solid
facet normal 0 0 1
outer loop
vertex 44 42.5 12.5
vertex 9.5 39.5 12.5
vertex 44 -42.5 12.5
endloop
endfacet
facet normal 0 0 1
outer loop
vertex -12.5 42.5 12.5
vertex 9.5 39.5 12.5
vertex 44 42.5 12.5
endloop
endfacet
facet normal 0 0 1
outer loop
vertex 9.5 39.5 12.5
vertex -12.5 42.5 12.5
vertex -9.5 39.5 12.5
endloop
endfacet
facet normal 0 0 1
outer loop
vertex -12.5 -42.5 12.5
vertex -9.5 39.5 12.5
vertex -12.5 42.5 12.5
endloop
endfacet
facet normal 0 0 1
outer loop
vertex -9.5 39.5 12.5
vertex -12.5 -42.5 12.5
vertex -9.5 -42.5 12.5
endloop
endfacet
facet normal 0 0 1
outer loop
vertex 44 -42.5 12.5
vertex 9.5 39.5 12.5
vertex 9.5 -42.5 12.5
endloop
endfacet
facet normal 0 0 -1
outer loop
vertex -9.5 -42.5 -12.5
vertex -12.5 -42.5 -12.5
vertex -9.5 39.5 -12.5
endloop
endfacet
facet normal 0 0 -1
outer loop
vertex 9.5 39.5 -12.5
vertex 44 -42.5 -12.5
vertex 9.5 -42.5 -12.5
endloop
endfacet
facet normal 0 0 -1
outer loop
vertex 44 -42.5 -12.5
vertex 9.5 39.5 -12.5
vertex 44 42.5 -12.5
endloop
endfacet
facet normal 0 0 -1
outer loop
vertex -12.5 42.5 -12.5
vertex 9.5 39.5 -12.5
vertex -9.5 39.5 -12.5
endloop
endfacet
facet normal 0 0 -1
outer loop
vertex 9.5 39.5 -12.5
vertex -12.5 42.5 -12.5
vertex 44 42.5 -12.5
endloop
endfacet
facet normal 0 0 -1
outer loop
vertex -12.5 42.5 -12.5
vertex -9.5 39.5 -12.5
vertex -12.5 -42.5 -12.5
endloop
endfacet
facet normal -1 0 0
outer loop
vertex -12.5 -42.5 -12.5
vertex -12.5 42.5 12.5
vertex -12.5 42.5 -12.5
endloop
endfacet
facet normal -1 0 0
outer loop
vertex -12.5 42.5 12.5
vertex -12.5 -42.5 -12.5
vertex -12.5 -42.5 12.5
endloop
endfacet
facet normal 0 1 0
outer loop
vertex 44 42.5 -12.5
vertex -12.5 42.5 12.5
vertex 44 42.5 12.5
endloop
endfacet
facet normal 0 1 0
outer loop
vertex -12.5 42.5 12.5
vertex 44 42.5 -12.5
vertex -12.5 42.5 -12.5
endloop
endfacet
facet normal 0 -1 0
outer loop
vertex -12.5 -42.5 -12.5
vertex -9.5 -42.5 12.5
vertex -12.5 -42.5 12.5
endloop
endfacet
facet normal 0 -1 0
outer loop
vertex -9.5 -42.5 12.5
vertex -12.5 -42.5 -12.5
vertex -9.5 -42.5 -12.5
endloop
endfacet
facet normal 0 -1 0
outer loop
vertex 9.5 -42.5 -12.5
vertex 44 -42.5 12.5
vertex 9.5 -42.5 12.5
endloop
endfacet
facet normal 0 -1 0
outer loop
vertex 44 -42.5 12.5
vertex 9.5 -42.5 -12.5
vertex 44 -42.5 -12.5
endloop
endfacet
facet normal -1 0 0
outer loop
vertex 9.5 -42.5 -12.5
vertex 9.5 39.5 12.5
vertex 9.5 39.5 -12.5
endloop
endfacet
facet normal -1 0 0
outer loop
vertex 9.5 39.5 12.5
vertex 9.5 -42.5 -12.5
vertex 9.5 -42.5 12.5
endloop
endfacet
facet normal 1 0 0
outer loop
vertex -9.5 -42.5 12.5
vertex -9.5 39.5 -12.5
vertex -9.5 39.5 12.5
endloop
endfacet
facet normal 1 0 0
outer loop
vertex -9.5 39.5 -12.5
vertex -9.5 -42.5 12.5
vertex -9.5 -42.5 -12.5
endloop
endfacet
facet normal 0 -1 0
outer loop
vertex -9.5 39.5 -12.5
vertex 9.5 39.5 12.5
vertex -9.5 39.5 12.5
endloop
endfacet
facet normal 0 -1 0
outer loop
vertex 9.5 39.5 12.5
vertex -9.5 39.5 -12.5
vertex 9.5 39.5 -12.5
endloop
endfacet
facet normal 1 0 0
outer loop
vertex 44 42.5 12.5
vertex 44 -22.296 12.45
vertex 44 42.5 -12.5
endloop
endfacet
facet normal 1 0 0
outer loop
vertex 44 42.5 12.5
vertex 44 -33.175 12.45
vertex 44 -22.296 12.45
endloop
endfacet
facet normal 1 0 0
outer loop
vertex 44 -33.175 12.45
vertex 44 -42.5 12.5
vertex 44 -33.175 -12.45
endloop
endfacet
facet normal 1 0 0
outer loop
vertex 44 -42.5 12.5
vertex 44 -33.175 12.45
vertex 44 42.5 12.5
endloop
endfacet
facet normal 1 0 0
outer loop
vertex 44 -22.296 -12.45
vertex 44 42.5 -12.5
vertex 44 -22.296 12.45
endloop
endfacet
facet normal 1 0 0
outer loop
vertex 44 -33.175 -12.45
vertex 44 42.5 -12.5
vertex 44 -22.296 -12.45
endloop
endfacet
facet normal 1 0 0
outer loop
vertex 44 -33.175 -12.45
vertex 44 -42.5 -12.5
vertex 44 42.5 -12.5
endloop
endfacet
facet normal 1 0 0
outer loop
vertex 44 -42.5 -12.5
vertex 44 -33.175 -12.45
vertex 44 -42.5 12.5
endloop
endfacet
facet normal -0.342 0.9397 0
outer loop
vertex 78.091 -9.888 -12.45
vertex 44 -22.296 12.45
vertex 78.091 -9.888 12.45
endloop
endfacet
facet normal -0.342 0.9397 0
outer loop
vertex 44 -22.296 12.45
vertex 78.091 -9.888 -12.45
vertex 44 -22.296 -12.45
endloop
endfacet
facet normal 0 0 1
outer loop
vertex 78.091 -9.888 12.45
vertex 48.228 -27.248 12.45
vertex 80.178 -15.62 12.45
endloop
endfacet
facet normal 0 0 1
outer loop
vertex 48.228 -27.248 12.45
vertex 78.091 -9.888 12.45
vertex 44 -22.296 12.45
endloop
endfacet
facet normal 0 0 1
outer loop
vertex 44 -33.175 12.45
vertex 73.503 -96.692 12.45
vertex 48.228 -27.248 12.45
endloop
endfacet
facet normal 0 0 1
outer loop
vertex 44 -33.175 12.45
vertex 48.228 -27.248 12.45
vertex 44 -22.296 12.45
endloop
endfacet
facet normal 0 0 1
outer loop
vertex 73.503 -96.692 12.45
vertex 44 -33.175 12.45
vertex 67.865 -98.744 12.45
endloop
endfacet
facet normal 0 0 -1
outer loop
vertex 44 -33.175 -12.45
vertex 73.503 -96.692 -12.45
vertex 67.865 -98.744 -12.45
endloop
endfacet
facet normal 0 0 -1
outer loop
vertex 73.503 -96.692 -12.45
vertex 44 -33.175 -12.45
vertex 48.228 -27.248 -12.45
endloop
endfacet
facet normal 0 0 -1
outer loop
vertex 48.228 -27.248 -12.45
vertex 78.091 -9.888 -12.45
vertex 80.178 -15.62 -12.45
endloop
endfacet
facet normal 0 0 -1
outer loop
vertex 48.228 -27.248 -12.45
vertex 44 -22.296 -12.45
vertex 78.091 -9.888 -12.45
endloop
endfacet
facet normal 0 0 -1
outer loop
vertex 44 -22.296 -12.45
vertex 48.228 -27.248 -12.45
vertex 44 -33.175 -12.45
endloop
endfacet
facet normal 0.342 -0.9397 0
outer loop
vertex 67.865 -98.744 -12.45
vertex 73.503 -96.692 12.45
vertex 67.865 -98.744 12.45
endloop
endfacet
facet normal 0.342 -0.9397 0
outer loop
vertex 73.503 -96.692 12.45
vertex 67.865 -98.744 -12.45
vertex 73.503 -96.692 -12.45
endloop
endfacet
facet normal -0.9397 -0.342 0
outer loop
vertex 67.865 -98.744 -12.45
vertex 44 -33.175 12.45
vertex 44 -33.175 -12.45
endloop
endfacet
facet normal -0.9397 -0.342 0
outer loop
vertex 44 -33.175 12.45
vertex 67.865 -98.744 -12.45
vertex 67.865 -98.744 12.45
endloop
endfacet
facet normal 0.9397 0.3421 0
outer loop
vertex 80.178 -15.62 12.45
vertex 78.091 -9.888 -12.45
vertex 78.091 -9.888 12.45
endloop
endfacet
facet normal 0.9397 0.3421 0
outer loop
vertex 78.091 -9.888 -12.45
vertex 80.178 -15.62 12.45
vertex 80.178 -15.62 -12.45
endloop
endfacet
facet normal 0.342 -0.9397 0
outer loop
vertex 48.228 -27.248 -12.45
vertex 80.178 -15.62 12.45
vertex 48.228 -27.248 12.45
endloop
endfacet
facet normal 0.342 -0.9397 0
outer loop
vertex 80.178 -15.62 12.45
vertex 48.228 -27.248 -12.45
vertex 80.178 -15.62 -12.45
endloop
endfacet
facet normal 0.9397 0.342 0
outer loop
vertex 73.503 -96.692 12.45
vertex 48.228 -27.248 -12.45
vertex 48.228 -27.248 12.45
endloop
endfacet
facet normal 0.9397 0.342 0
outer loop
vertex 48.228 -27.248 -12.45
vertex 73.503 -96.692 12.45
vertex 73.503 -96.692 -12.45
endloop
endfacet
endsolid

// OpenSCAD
    union() {
        union() {
            difference(){
                color("blue") cube ([25, 85, 25], center=true);
                color("red") translate ([0, -3, 0]) cube ([19, 85, 200], center=true);
            }
        }

        color("yellow")
            difference(){
                translate([28, 0, 0]) difference() {
                    cube ([32, 85, 25], center=true);
                }
                rotate(a=110) translate([-65, -32, 0]) union() {
*                        color("blue") cube ([80, 40, 25.1], center=true);
                    }
                }


        rotate(a=110)
            translate([-76, -50, 0]) union() {
                difference(){
                    color("blue") cube ([80, 40, 24.9], center=true);
                    color("red") translate ([-6.1, -6, 0]) cube ([80, 40, 200], center=true);
                }
            }





        *color("yellow")
            rotate(a=135)
                translate([7.5, 38.41, -10]) difference() {
                    cube ([30, 2, 20]);
                }

        *color("pink")
            rotate(a=45)
                translate([-40.5, 7.41, -10]) difference() {
                    cube ([50, 2, 20]);
                }

        *color("orange") 
            rotate(a=135) 
                translate([-4, -9.6, -10]) 
                    cube ([12, 2, 20]);
    }
